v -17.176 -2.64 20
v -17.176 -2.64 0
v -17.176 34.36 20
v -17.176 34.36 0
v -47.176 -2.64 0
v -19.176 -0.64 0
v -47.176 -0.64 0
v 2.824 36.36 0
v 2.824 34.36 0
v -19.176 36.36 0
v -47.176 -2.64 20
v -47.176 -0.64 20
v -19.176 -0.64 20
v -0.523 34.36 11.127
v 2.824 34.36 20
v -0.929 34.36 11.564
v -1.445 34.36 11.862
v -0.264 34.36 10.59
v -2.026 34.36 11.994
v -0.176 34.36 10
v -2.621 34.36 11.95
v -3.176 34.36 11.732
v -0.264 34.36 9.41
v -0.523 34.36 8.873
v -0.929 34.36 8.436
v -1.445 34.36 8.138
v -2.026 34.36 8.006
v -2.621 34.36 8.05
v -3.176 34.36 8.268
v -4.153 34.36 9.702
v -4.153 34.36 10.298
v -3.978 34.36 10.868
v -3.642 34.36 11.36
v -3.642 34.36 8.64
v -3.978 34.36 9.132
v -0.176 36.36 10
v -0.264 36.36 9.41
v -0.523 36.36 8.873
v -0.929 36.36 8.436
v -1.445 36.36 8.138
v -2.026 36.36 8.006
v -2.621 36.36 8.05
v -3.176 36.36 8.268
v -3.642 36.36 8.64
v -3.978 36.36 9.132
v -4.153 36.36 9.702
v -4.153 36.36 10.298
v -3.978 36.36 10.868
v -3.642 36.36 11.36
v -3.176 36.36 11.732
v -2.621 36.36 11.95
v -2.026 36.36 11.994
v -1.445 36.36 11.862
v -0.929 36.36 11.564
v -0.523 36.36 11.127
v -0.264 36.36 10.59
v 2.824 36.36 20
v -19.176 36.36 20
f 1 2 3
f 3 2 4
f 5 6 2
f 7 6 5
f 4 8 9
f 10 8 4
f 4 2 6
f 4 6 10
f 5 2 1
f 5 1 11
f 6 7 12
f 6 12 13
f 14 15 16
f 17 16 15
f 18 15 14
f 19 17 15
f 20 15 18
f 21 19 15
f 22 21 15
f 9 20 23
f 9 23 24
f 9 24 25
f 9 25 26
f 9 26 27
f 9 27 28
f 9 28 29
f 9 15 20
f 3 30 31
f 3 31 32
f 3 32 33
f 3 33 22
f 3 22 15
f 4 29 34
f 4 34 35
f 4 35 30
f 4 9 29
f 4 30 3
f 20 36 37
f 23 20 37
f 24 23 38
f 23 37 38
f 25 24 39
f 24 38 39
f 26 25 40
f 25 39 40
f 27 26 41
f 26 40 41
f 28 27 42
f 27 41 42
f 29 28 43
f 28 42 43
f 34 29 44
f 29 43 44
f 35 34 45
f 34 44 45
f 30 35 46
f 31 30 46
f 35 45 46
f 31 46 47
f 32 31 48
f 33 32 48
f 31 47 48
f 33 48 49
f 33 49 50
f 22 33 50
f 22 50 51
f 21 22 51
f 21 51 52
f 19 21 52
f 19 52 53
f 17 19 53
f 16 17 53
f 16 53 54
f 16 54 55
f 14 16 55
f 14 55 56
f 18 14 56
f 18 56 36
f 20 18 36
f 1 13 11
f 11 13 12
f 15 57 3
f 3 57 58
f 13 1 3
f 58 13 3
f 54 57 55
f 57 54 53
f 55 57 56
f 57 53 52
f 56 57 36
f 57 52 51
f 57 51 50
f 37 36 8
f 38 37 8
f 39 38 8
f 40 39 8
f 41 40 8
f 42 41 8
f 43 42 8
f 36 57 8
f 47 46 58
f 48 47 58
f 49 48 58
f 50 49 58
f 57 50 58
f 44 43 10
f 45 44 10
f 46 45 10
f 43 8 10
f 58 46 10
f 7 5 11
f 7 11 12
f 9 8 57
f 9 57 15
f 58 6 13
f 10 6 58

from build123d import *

# Parameters (mm, degrees)
EXTRUDE_1_DEPTH     = 20
SKETCH_2_R          = 2
CUT_EXTRUDE_1_DEPTH = 20


with BuildPart() as part:
    # 草图1 → 凸台-拉伸1 (new body)
    with BuildSketch(Plane.XY):
        Polygon((-17.175607408, 36.360314389), (-7.175607408, 36.360314389), (2.824392592, 36.360314389), (2.824392592, 34.360314389), (-17.175607408, 34.360314389), (-17.175607408, -0.639685611), (-17.175607408, -2.639685611), (-47.175607408, -2.639685611), (-47.175607408, -0.639685611), (-19.175607408, -0.639685611), (-19.175607408, 36.360314389), align=None)
    extrude(amount=EXTRUDE_1_DEPTH)

    # 草图2 → 切除-拉伸1 (cut)
    with BuildSketch(Plane(origin=(0, 36.360314389, 0), x_dir=(1, 0, 0), z_dir=(0, 1, 0))):
        with Locations((-2.175607408, -10)):
            Circle(SKETCH_2_R)
    extrude(amount=-CUT_EXTRUDE_1_DEPTH, mode=Mode.SUBTRACT)


solid = part.part
